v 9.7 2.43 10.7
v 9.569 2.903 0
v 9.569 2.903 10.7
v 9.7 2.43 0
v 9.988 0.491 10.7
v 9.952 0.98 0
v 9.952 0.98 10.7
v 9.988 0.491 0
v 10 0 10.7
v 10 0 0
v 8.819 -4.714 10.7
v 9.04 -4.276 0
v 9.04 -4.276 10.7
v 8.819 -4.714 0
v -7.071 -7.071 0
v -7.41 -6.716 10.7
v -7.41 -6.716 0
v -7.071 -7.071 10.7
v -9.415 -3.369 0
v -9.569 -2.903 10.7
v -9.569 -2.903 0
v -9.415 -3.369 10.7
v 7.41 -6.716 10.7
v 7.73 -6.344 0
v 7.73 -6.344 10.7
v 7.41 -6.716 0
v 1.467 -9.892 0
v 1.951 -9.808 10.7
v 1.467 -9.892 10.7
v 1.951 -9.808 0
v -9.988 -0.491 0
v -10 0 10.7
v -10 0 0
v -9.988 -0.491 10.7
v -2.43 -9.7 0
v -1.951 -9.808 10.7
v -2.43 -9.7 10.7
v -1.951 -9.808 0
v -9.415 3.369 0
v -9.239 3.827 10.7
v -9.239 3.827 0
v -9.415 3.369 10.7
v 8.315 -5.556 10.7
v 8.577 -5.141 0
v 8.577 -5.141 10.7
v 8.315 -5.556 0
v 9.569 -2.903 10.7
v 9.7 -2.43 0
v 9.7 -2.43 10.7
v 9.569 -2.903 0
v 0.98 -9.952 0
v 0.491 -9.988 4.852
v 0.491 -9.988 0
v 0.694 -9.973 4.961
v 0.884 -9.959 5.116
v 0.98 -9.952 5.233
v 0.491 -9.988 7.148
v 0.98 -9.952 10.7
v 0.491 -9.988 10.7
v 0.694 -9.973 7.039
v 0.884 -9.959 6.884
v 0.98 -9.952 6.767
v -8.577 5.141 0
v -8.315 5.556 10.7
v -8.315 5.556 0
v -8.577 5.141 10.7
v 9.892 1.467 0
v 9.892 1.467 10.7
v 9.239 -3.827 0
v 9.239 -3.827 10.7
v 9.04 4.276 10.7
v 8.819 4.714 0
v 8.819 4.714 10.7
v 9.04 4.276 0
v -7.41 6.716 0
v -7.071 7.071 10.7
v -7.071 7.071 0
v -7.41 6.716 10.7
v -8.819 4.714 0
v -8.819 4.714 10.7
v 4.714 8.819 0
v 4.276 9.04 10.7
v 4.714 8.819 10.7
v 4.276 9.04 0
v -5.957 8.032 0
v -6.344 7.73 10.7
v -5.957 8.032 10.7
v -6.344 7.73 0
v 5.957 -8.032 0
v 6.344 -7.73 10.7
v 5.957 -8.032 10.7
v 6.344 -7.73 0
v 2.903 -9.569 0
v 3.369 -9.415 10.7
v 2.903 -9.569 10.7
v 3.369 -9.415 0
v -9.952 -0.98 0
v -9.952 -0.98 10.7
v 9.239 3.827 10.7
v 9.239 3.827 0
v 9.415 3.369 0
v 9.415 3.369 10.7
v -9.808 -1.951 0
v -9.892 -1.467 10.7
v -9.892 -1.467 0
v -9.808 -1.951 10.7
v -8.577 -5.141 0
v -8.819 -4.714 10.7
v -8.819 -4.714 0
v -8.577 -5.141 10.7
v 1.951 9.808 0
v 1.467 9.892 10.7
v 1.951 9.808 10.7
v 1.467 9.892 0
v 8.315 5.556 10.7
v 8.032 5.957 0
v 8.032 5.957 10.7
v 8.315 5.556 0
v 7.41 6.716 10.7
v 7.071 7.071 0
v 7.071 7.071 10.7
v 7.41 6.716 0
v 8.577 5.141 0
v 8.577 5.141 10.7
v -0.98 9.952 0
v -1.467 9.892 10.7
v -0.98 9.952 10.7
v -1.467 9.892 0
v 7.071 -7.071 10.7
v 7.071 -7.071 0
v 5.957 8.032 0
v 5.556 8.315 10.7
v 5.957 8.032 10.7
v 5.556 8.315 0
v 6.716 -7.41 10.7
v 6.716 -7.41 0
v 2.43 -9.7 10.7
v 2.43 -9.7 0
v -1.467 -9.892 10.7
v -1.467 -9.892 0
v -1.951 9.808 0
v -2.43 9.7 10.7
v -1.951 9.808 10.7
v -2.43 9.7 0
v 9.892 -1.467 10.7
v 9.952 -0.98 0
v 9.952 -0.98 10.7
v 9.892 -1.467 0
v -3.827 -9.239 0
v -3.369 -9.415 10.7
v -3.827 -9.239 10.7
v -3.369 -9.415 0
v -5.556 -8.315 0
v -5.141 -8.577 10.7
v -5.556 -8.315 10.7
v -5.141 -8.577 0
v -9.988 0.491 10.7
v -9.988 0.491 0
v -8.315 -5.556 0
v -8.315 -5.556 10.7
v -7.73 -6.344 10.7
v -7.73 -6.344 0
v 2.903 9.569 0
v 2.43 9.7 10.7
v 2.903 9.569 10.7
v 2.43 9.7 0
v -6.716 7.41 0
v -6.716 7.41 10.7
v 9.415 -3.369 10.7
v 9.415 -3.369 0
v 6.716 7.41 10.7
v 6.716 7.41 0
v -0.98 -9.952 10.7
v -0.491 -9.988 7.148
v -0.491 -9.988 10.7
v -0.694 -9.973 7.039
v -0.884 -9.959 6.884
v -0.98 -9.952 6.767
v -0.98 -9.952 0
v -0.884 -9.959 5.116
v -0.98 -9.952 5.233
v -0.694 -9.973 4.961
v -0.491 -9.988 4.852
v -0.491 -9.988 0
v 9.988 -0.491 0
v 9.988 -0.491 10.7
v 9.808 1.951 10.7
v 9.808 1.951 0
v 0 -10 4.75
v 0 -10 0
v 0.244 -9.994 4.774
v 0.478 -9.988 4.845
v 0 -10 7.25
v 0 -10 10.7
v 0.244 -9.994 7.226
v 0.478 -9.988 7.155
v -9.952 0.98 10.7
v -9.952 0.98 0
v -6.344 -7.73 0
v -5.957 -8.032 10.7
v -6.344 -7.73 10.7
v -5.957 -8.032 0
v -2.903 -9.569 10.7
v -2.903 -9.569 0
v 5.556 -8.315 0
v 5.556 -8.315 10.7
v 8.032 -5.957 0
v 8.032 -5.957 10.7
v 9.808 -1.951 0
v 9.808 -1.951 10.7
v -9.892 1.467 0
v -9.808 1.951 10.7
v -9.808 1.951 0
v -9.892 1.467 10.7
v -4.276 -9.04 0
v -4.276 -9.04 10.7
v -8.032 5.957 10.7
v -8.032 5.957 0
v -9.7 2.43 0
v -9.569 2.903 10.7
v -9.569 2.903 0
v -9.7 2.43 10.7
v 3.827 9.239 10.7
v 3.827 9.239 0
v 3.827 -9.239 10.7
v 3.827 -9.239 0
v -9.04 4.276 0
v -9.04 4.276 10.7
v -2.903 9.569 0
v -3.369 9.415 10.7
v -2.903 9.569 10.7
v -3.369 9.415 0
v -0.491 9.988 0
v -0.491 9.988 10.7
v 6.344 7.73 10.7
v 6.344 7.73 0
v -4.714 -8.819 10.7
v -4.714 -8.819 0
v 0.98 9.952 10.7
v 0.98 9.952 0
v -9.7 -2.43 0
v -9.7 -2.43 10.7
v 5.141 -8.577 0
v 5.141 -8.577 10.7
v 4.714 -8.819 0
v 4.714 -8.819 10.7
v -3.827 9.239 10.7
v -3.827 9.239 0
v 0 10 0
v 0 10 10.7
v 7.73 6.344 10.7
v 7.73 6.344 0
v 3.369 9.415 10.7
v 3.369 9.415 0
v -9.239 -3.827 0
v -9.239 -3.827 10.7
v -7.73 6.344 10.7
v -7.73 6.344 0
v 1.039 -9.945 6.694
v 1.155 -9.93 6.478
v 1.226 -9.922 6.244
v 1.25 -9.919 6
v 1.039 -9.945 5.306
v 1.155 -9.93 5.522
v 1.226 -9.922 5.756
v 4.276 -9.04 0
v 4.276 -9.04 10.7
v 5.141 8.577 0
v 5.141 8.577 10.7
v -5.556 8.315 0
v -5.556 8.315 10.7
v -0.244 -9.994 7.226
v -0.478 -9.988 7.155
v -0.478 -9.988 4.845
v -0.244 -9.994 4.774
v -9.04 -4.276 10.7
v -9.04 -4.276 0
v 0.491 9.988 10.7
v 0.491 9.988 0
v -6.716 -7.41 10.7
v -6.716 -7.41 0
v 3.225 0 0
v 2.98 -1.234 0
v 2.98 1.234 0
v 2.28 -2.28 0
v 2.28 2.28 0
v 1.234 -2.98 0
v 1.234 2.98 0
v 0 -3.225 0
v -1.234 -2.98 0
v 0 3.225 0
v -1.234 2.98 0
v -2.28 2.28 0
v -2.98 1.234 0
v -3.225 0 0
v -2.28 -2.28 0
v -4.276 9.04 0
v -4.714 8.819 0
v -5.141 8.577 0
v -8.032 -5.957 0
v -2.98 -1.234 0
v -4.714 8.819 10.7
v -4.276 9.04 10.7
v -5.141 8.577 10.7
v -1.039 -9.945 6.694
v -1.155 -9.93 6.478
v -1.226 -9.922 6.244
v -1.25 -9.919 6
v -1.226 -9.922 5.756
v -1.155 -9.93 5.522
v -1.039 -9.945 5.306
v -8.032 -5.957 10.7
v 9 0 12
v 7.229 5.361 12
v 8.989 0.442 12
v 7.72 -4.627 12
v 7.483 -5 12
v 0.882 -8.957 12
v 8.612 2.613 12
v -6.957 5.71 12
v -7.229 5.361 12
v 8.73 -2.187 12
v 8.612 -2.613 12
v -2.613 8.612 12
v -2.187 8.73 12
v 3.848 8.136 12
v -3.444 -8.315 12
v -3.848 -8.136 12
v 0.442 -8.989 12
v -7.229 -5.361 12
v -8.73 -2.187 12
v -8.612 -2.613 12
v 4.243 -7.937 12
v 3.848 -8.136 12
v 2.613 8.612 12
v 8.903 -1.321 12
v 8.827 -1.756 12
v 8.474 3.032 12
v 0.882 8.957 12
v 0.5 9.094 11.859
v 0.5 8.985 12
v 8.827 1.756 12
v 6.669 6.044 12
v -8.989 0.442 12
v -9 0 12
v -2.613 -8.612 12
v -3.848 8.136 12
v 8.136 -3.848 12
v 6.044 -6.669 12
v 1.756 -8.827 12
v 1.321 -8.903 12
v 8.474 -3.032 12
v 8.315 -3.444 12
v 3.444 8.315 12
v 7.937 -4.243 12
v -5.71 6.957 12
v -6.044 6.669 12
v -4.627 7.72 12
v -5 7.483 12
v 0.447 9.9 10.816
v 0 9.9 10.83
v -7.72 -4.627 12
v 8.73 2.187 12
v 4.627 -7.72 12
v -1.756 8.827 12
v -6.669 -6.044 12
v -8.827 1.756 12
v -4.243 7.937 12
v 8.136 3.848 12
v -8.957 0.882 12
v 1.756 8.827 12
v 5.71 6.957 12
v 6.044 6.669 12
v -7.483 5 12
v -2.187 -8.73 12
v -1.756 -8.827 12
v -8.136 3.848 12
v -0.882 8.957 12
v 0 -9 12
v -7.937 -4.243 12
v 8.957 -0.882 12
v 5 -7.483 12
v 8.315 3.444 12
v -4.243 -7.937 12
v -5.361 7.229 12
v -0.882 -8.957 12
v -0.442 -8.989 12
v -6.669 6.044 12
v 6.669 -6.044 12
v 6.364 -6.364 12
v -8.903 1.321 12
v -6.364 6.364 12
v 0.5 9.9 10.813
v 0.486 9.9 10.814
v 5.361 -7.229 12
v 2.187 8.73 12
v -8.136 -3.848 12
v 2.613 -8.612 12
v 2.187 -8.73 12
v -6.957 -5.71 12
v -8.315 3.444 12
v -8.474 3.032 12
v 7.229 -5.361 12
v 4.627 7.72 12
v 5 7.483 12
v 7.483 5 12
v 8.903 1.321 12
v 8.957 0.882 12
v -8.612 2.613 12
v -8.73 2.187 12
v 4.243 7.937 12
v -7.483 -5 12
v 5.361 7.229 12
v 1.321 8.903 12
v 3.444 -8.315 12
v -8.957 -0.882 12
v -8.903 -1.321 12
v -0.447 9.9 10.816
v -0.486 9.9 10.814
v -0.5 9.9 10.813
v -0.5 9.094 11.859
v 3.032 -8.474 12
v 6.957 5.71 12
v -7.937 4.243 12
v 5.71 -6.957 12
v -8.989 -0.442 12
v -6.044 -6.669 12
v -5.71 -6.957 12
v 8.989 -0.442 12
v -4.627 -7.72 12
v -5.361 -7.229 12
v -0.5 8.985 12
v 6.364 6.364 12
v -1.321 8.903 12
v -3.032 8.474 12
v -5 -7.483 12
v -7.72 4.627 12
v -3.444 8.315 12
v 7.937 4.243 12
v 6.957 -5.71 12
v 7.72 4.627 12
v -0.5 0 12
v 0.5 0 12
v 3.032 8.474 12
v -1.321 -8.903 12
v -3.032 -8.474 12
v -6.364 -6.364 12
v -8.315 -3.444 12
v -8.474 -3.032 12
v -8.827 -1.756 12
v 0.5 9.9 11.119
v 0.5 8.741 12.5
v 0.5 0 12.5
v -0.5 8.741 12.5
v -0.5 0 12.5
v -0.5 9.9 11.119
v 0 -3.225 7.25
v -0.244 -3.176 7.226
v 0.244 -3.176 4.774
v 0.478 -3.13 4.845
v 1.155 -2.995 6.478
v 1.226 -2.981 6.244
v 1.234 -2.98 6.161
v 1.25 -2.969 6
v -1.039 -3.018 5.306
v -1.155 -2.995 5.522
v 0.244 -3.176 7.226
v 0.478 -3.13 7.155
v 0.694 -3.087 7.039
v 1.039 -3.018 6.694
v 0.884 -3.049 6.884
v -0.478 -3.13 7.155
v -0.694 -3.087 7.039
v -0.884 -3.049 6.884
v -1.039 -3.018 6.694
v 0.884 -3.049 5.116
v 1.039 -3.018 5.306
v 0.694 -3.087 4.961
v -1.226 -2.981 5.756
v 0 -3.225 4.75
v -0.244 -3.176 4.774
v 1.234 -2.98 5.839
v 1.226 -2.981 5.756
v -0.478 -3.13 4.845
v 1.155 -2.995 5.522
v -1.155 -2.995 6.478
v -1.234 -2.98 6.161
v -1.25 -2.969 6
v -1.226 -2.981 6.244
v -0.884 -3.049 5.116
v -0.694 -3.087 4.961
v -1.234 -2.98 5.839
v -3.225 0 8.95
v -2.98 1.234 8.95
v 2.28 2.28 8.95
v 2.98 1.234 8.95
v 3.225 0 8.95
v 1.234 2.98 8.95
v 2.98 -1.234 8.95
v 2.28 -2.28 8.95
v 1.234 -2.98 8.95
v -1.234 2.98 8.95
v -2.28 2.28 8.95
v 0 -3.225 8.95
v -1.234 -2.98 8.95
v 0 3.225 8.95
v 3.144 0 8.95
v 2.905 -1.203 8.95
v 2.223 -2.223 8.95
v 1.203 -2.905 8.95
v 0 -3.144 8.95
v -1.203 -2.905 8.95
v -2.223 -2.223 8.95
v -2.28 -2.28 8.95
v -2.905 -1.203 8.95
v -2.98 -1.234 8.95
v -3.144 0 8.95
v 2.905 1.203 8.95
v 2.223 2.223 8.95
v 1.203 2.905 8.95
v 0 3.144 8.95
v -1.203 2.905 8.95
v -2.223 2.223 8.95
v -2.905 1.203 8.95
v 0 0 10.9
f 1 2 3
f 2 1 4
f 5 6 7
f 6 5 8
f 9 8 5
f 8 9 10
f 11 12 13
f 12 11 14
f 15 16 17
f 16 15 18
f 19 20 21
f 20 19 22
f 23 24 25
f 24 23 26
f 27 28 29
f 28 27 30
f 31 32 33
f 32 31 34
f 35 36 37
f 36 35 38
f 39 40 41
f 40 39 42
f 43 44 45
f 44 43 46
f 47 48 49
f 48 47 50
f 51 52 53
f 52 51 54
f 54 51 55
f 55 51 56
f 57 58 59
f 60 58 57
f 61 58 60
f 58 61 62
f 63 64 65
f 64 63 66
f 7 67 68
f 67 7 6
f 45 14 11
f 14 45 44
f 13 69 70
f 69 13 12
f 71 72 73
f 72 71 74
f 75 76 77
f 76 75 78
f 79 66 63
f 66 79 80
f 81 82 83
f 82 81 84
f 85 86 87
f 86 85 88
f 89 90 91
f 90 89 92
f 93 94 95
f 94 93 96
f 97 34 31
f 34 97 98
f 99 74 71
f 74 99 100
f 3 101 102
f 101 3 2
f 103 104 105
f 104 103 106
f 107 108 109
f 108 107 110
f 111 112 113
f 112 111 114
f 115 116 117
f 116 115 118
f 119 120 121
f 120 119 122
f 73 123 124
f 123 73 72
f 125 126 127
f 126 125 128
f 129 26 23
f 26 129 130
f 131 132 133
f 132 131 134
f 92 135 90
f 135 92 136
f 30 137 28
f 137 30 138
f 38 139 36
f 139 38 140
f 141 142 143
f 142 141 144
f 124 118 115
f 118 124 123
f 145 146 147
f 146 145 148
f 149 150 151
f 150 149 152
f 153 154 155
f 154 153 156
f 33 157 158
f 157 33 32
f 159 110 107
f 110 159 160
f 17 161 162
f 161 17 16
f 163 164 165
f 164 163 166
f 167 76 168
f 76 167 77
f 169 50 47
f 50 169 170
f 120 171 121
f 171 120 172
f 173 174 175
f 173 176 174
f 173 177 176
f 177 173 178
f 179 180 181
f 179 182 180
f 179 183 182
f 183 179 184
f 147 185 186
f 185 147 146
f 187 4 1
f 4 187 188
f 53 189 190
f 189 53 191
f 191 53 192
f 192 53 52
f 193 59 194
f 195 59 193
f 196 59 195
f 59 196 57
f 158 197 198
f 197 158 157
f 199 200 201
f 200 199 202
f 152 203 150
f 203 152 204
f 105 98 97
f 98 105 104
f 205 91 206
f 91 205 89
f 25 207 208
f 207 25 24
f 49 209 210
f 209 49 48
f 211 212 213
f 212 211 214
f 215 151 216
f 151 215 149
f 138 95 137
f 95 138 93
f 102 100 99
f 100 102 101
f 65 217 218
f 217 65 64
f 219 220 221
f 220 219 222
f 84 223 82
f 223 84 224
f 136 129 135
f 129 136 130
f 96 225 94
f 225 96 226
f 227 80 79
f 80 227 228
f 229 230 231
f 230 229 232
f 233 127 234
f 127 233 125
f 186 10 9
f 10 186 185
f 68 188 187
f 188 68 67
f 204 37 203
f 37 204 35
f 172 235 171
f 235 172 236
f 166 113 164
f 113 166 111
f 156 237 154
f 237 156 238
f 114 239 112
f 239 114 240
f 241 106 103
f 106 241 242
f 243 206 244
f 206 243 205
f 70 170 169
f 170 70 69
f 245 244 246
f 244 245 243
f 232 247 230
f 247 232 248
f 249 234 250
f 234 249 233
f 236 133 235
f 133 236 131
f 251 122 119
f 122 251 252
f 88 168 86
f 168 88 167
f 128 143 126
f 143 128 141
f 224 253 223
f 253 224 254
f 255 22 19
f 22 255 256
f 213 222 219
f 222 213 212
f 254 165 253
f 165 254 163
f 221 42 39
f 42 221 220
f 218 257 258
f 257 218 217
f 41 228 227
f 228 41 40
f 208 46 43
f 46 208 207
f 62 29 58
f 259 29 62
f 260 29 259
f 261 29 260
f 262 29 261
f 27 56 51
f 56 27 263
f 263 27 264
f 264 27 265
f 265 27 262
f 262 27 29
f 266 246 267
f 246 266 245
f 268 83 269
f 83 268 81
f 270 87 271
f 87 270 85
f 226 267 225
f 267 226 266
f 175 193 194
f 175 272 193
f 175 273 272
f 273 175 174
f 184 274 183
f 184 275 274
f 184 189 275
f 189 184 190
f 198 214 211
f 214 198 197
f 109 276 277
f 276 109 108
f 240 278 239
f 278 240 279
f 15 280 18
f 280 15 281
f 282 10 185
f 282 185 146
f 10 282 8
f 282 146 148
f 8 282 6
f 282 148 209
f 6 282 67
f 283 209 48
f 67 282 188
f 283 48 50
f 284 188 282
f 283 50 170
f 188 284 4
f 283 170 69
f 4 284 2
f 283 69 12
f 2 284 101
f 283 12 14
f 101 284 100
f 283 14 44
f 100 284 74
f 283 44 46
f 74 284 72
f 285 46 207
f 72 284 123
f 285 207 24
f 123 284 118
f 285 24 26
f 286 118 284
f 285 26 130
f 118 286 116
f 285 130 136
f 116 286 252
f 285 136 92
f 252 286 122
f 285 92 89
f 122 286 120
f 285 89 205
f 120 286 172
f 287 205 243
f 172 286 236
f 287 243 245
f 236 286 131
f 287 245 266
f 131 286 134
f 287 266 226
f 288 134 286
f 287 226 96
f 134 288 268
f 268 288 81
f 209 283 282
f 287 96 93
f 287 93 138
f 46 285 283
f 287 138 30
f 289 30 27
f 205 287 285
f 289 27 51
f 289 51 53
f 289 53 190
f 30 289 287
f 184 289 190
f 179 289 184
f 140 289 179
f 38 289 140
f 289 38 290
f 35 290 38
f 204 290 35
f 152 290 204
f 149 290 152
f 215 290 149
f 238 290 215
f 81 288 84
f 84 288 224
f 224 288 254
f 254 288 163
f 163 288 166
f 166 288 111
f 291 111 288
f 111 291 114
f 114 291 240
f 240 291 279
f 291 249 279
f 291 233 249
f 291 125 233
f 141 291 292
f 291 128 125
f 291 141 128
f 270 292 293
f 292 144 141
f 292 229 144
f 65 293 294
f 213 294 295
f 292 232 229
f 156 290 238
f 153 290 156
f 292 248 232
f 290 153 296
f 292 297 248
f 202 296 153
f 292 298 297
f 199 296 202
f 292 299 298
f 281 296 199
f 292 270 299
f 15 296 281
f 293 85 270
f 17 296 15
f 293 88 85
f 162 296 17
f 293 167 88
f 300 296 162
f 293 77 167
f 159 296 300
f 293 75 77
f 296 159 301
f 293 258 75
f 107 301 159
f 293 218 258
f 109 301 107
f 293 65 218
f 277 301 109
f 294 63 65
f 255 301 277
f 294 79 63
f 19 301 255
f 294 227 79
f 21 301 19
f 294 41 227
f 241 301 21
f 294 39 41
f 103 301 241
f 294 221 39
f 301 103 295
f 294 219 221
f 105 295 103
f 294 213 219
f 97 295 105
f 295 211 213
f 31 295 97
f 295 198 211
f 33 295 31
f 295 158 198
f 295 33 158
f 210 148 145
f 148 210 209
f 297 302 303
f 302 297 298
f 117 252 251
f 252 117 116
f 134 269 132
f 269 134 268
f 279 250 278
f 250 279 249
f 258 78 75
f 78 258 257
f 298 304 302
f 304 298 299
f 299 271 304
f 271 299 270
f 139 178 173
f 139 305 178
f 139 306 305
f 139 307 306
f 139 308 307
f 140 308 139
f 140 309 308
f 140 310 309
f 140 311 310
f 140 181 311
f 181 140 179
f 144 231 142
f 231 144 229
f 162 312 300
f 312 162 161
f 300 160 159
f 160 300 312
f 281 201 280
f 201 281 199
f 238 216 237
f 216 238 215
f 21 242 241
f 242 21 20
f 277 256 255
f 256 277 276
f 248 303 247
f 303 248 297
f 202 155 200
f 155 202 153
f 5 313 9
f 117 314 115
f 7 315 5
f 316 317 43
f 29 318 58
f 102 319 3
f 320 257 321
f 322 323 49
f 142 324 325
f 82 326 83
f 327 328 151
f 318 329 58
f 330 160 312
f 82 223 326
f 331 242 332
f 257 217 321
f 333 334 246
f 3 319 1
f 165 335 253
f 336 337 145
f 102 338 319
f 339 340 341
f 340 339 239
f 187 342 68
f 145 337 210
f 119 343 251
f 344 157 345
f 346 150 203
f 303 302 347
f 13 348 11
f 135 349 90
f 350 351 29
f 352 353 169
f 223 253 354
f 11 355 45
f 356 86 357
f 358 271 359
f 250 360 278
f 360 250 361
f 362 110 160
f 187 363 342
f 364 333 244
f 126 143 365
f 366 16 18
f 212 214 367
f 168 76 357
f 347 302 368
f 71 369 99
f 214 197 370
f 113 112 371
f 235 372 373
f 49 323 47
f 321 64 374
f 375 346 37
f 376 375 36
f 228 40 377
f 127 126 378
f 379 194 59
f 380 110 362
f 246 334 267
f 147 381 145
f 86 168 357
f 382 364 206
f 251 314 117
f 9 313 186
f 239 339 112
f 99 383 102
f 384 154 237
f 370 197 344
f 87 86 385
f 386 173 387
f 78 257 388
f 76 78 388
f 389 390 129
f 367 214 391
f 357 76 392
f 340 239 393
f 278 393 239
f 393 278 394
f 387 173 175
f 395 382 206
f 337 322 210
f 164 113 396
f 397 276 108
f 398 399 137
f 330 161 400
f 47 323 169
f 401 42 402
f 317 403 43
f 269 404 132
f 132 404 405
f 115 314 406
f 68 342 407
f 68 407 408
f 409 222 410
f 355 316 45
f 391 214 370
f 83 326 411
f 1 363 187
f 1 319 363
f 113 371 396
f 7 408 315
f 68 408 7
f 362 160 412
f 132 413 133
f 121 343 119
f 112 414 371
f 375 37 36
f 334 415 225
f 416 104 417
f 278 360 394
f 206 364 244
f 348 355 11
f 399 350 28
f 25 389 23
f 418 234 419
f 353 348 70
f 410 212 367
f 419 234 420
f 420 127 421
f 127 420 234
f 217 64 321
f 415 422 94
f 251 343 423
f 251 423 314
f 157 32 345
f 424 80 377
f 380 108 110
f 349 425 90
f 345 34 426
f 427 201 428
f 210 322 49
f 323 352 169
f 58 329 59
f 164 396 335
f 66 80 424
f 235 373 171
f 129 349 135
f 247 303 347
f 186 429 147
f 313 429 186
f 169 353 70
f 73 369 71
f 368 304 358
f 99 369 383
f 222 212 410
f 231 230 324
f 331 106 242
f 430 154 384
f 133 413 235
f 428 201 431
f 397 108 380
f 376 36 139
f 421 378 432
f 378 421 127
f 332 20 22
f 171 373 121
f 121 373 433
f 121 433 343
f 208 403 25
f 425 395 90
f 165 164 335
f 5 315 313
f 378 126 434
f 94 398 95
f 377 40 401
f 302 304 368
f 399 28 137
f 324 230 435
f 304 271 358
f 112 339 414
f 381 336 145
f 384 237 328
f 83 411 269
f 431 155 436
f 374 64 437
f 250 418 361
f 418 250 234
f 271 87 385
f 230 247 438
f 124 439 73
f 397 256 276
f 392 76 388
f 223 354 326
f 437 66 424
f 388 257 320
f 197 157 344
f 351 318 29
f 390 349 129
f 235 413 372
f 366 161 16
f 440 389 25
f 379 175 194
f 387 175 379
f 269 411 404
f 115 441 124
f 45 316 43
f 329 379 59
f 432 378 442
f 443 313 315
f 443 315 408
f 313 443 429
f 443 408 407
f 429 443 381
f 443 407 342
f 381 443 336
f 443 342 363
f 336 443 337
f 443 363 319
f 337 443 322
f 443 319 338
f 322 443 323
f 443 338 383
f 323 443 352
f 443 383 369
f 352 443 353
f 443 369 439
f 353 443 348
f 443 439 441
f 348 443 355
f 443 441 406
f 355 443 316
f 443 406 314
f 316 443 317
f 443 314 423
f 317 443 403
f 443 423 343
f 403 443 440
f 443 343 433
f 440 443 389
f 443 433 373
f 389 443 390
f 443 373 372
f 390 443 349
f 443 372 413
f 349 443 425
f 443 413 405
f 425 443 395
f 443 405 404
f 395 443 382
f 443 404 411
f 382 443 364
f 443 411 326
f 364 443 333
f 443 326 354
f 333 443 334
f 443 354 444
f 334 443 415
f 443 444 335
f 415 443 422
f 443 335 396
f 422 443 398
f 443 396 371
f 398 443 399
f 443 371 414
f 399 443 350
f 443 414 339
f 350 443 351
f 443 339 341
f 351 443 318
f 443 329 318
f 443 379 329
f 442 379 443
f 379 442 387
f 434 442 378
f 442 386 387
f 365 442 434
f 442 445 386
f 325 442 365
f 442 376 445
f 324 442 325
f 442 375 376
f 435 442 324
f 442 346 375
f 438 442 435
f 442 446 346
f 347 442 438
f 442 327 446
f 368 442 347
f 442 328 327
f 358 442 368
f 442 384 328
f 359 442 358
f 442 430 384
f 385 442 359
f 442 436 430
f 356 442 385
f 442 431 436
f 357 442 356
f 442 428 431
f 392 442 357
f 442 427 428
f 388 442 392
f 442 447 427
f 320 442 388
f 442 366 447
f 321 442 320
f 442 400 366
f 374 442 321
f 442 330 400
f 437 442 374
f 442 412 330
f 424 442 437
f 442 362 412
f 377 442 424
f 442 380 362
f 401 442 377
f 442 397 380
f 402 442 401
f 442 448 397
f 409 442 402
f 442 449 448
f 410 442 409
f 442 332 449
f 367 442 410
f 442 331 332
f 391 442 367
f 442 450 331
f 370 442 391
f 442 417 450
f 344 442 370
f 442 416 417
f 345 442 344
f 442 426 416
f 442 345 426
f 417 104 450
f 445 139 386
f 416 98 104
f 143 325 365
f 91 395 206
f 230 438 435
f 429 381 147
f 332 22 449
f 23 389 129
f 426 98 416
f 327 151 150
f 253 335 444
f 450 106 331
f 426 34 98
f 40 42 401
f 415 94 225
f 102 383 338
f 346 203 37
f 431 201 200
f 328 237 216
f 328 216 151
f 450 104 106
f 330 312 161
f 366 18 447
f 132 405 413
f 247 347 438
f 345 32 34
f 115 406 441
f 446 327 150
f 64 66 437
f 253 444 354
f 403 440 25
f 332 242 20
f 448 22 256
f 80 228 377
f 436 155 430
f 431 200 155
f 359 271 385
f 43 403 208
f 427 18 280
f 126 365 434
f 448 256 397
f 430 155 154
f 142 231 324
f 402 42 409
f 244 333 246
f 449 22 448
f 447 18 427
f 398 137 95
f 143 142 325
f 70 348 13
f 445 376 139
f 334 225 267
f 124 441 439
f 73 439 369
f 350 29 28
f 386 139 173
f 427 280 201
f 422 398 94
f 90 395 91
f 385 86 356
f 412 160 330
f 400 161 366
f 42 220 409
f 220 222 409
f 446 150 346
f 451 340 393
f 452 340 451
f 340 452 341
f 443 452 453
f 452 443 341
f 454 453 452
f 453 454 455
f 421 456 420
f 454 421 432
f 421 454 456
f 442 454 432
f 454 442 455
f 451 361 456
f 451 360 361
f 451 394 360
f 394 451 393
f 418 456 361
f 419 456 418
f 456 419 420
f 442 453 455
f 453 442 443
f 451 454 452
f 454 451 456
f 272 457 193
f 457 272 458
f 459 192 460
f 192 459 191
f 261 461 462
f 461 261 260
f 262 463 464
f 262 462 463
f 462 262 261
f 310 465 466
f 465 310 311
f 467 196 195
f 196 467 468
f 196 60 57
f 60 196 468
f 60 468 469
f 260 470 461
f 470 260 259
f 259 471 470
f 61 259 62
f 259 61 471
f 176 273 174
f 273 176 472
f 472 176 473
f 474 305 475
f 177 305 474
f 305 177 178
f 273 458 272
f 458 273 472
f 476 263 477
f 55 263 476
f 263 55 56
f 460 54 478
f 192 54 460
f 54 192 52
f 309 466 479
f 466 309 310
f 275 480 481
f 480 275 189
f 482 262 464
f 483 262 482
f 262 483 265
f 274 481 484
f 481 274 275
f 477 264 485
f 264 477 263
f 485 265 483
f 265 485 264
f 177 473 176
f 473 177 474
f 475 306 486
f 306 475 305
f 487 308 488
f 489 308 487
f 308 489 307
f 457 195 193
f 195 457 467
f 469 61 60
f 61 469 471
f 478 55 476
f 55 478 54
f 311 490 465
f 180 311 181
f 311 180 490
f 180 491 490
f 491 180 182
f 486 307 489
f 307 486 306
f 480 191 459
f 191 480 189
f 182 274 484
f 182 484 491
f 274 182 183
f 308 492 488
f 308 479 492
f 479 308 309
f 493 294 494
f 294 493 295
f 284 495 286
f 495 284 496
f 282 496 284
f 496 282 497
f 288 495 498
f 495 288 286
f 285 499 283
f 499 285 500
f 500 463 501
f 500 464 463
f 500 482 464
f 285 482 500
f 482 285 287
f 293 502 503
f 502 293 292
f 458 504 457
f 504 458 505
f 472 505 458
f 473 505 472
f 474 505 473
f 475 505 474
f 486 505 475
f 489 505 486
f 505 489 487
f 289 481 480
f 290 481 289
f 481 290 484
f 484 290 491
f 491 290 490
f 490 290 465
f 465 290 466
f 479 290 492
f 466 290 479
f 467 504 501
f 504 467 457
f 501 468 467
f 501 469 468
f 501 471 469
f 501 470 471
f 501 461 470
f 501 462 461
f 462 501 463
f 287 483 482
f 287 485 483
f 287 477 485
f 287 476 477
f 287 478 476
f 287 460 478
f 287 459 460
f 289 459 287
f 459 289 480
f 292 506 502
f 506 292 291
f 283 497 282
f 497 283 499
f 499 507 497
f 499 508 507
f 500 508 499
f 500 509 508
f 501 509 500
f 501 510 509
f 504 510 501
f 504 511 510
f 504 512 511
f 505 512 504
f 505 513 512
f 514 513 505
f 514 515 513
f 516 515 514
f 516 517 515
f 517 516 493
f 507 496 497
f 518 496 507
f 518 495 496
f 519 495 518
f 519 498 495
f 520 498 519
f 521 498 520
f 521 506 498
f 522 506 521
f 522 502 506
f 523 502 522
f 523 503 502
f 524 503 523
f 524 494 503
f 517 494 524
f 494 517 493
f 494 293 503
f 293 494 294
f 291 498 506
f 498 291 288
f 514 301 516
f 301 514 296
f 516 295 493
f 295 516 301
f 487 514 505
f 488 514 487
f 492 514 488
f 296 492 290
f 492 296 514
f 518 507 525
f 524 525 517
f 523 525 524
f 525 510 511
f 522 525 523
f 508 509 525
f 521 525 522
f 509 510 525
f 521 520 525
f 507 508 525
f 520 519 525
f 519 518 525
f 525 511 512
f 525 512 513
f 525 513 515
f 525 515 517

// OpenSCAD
//OpenSCAD-Skript

//Moduldefinition mit Parametern für Frontplattensystem im 19mm-Raster
module PotiKnopf (
//Parameter
diami=6.45,   //Wellendurchmesser Poti
diama=20,    //Außendurchmesser Knopf
diams=2.5,   //Klemmschraubendurchmesser 
hght=12,     //Höhe Knopf
hghti=12.5,  //Höhe Indikator
wdthi=1      //Breite Indikator
)
//Beginn Modul
{
difference(){   //difference 1
union(){        //union 1
difference(){   //difference 2
union(){        //union 2
    //alles, was vor der nächsten geschweiften Klammer steht, wird zusammengefügt (union 2)
//Körper des Frontplattensegments
cylinder(d=diama,h=hght-1.3,$fn=128);
translate([0,0,hght-1.3]) cylinder(d1=diama,d2=diama-2,h=1.3,$fn=128);
 
//Indikator
translate([-wdthi/2,0,0]) cube([wdthi,diama/2-0.1,hghti]);

}               //union 2 end
    //alles, was vor der nächsten geschweiften Klammer steht, wird davon abgezogen (difference 2)
//Anschrägung Indikator
translate([-wdthi,diama/2,hght-1]) rotate([40,0,0]) cube([2*wdthi,5,5]);
//Bohrung Klemmschraube M3
rotate([90,0,0]) translate([0,hght/2,0]) cylinder(d=diams,h=15,$fn=32);
//Bohrung Achse
translate([0,0,-0.05]) cylinder(d=diami,h=hght-3,$fn=16);
translate([0,0,hght-3-0.1]) cylinder(d1=diami,d2=0,h=2,$fn=16);
}  //difference 2 end
    //alles, was vor der nächsten geschweiften Klammer steht, wird dazu hinzugefügt (union 1)

}               //union 1 end
    //alles, was vor der nächsten geschweiften Klammer steht, wird davon wieder abgezogen (difference 1)

}               //difference 1 end

}  //module end

//Hier werden Instanzen des Moduls aufgerufen
translate([0,0,0]) PotiKnopf();
